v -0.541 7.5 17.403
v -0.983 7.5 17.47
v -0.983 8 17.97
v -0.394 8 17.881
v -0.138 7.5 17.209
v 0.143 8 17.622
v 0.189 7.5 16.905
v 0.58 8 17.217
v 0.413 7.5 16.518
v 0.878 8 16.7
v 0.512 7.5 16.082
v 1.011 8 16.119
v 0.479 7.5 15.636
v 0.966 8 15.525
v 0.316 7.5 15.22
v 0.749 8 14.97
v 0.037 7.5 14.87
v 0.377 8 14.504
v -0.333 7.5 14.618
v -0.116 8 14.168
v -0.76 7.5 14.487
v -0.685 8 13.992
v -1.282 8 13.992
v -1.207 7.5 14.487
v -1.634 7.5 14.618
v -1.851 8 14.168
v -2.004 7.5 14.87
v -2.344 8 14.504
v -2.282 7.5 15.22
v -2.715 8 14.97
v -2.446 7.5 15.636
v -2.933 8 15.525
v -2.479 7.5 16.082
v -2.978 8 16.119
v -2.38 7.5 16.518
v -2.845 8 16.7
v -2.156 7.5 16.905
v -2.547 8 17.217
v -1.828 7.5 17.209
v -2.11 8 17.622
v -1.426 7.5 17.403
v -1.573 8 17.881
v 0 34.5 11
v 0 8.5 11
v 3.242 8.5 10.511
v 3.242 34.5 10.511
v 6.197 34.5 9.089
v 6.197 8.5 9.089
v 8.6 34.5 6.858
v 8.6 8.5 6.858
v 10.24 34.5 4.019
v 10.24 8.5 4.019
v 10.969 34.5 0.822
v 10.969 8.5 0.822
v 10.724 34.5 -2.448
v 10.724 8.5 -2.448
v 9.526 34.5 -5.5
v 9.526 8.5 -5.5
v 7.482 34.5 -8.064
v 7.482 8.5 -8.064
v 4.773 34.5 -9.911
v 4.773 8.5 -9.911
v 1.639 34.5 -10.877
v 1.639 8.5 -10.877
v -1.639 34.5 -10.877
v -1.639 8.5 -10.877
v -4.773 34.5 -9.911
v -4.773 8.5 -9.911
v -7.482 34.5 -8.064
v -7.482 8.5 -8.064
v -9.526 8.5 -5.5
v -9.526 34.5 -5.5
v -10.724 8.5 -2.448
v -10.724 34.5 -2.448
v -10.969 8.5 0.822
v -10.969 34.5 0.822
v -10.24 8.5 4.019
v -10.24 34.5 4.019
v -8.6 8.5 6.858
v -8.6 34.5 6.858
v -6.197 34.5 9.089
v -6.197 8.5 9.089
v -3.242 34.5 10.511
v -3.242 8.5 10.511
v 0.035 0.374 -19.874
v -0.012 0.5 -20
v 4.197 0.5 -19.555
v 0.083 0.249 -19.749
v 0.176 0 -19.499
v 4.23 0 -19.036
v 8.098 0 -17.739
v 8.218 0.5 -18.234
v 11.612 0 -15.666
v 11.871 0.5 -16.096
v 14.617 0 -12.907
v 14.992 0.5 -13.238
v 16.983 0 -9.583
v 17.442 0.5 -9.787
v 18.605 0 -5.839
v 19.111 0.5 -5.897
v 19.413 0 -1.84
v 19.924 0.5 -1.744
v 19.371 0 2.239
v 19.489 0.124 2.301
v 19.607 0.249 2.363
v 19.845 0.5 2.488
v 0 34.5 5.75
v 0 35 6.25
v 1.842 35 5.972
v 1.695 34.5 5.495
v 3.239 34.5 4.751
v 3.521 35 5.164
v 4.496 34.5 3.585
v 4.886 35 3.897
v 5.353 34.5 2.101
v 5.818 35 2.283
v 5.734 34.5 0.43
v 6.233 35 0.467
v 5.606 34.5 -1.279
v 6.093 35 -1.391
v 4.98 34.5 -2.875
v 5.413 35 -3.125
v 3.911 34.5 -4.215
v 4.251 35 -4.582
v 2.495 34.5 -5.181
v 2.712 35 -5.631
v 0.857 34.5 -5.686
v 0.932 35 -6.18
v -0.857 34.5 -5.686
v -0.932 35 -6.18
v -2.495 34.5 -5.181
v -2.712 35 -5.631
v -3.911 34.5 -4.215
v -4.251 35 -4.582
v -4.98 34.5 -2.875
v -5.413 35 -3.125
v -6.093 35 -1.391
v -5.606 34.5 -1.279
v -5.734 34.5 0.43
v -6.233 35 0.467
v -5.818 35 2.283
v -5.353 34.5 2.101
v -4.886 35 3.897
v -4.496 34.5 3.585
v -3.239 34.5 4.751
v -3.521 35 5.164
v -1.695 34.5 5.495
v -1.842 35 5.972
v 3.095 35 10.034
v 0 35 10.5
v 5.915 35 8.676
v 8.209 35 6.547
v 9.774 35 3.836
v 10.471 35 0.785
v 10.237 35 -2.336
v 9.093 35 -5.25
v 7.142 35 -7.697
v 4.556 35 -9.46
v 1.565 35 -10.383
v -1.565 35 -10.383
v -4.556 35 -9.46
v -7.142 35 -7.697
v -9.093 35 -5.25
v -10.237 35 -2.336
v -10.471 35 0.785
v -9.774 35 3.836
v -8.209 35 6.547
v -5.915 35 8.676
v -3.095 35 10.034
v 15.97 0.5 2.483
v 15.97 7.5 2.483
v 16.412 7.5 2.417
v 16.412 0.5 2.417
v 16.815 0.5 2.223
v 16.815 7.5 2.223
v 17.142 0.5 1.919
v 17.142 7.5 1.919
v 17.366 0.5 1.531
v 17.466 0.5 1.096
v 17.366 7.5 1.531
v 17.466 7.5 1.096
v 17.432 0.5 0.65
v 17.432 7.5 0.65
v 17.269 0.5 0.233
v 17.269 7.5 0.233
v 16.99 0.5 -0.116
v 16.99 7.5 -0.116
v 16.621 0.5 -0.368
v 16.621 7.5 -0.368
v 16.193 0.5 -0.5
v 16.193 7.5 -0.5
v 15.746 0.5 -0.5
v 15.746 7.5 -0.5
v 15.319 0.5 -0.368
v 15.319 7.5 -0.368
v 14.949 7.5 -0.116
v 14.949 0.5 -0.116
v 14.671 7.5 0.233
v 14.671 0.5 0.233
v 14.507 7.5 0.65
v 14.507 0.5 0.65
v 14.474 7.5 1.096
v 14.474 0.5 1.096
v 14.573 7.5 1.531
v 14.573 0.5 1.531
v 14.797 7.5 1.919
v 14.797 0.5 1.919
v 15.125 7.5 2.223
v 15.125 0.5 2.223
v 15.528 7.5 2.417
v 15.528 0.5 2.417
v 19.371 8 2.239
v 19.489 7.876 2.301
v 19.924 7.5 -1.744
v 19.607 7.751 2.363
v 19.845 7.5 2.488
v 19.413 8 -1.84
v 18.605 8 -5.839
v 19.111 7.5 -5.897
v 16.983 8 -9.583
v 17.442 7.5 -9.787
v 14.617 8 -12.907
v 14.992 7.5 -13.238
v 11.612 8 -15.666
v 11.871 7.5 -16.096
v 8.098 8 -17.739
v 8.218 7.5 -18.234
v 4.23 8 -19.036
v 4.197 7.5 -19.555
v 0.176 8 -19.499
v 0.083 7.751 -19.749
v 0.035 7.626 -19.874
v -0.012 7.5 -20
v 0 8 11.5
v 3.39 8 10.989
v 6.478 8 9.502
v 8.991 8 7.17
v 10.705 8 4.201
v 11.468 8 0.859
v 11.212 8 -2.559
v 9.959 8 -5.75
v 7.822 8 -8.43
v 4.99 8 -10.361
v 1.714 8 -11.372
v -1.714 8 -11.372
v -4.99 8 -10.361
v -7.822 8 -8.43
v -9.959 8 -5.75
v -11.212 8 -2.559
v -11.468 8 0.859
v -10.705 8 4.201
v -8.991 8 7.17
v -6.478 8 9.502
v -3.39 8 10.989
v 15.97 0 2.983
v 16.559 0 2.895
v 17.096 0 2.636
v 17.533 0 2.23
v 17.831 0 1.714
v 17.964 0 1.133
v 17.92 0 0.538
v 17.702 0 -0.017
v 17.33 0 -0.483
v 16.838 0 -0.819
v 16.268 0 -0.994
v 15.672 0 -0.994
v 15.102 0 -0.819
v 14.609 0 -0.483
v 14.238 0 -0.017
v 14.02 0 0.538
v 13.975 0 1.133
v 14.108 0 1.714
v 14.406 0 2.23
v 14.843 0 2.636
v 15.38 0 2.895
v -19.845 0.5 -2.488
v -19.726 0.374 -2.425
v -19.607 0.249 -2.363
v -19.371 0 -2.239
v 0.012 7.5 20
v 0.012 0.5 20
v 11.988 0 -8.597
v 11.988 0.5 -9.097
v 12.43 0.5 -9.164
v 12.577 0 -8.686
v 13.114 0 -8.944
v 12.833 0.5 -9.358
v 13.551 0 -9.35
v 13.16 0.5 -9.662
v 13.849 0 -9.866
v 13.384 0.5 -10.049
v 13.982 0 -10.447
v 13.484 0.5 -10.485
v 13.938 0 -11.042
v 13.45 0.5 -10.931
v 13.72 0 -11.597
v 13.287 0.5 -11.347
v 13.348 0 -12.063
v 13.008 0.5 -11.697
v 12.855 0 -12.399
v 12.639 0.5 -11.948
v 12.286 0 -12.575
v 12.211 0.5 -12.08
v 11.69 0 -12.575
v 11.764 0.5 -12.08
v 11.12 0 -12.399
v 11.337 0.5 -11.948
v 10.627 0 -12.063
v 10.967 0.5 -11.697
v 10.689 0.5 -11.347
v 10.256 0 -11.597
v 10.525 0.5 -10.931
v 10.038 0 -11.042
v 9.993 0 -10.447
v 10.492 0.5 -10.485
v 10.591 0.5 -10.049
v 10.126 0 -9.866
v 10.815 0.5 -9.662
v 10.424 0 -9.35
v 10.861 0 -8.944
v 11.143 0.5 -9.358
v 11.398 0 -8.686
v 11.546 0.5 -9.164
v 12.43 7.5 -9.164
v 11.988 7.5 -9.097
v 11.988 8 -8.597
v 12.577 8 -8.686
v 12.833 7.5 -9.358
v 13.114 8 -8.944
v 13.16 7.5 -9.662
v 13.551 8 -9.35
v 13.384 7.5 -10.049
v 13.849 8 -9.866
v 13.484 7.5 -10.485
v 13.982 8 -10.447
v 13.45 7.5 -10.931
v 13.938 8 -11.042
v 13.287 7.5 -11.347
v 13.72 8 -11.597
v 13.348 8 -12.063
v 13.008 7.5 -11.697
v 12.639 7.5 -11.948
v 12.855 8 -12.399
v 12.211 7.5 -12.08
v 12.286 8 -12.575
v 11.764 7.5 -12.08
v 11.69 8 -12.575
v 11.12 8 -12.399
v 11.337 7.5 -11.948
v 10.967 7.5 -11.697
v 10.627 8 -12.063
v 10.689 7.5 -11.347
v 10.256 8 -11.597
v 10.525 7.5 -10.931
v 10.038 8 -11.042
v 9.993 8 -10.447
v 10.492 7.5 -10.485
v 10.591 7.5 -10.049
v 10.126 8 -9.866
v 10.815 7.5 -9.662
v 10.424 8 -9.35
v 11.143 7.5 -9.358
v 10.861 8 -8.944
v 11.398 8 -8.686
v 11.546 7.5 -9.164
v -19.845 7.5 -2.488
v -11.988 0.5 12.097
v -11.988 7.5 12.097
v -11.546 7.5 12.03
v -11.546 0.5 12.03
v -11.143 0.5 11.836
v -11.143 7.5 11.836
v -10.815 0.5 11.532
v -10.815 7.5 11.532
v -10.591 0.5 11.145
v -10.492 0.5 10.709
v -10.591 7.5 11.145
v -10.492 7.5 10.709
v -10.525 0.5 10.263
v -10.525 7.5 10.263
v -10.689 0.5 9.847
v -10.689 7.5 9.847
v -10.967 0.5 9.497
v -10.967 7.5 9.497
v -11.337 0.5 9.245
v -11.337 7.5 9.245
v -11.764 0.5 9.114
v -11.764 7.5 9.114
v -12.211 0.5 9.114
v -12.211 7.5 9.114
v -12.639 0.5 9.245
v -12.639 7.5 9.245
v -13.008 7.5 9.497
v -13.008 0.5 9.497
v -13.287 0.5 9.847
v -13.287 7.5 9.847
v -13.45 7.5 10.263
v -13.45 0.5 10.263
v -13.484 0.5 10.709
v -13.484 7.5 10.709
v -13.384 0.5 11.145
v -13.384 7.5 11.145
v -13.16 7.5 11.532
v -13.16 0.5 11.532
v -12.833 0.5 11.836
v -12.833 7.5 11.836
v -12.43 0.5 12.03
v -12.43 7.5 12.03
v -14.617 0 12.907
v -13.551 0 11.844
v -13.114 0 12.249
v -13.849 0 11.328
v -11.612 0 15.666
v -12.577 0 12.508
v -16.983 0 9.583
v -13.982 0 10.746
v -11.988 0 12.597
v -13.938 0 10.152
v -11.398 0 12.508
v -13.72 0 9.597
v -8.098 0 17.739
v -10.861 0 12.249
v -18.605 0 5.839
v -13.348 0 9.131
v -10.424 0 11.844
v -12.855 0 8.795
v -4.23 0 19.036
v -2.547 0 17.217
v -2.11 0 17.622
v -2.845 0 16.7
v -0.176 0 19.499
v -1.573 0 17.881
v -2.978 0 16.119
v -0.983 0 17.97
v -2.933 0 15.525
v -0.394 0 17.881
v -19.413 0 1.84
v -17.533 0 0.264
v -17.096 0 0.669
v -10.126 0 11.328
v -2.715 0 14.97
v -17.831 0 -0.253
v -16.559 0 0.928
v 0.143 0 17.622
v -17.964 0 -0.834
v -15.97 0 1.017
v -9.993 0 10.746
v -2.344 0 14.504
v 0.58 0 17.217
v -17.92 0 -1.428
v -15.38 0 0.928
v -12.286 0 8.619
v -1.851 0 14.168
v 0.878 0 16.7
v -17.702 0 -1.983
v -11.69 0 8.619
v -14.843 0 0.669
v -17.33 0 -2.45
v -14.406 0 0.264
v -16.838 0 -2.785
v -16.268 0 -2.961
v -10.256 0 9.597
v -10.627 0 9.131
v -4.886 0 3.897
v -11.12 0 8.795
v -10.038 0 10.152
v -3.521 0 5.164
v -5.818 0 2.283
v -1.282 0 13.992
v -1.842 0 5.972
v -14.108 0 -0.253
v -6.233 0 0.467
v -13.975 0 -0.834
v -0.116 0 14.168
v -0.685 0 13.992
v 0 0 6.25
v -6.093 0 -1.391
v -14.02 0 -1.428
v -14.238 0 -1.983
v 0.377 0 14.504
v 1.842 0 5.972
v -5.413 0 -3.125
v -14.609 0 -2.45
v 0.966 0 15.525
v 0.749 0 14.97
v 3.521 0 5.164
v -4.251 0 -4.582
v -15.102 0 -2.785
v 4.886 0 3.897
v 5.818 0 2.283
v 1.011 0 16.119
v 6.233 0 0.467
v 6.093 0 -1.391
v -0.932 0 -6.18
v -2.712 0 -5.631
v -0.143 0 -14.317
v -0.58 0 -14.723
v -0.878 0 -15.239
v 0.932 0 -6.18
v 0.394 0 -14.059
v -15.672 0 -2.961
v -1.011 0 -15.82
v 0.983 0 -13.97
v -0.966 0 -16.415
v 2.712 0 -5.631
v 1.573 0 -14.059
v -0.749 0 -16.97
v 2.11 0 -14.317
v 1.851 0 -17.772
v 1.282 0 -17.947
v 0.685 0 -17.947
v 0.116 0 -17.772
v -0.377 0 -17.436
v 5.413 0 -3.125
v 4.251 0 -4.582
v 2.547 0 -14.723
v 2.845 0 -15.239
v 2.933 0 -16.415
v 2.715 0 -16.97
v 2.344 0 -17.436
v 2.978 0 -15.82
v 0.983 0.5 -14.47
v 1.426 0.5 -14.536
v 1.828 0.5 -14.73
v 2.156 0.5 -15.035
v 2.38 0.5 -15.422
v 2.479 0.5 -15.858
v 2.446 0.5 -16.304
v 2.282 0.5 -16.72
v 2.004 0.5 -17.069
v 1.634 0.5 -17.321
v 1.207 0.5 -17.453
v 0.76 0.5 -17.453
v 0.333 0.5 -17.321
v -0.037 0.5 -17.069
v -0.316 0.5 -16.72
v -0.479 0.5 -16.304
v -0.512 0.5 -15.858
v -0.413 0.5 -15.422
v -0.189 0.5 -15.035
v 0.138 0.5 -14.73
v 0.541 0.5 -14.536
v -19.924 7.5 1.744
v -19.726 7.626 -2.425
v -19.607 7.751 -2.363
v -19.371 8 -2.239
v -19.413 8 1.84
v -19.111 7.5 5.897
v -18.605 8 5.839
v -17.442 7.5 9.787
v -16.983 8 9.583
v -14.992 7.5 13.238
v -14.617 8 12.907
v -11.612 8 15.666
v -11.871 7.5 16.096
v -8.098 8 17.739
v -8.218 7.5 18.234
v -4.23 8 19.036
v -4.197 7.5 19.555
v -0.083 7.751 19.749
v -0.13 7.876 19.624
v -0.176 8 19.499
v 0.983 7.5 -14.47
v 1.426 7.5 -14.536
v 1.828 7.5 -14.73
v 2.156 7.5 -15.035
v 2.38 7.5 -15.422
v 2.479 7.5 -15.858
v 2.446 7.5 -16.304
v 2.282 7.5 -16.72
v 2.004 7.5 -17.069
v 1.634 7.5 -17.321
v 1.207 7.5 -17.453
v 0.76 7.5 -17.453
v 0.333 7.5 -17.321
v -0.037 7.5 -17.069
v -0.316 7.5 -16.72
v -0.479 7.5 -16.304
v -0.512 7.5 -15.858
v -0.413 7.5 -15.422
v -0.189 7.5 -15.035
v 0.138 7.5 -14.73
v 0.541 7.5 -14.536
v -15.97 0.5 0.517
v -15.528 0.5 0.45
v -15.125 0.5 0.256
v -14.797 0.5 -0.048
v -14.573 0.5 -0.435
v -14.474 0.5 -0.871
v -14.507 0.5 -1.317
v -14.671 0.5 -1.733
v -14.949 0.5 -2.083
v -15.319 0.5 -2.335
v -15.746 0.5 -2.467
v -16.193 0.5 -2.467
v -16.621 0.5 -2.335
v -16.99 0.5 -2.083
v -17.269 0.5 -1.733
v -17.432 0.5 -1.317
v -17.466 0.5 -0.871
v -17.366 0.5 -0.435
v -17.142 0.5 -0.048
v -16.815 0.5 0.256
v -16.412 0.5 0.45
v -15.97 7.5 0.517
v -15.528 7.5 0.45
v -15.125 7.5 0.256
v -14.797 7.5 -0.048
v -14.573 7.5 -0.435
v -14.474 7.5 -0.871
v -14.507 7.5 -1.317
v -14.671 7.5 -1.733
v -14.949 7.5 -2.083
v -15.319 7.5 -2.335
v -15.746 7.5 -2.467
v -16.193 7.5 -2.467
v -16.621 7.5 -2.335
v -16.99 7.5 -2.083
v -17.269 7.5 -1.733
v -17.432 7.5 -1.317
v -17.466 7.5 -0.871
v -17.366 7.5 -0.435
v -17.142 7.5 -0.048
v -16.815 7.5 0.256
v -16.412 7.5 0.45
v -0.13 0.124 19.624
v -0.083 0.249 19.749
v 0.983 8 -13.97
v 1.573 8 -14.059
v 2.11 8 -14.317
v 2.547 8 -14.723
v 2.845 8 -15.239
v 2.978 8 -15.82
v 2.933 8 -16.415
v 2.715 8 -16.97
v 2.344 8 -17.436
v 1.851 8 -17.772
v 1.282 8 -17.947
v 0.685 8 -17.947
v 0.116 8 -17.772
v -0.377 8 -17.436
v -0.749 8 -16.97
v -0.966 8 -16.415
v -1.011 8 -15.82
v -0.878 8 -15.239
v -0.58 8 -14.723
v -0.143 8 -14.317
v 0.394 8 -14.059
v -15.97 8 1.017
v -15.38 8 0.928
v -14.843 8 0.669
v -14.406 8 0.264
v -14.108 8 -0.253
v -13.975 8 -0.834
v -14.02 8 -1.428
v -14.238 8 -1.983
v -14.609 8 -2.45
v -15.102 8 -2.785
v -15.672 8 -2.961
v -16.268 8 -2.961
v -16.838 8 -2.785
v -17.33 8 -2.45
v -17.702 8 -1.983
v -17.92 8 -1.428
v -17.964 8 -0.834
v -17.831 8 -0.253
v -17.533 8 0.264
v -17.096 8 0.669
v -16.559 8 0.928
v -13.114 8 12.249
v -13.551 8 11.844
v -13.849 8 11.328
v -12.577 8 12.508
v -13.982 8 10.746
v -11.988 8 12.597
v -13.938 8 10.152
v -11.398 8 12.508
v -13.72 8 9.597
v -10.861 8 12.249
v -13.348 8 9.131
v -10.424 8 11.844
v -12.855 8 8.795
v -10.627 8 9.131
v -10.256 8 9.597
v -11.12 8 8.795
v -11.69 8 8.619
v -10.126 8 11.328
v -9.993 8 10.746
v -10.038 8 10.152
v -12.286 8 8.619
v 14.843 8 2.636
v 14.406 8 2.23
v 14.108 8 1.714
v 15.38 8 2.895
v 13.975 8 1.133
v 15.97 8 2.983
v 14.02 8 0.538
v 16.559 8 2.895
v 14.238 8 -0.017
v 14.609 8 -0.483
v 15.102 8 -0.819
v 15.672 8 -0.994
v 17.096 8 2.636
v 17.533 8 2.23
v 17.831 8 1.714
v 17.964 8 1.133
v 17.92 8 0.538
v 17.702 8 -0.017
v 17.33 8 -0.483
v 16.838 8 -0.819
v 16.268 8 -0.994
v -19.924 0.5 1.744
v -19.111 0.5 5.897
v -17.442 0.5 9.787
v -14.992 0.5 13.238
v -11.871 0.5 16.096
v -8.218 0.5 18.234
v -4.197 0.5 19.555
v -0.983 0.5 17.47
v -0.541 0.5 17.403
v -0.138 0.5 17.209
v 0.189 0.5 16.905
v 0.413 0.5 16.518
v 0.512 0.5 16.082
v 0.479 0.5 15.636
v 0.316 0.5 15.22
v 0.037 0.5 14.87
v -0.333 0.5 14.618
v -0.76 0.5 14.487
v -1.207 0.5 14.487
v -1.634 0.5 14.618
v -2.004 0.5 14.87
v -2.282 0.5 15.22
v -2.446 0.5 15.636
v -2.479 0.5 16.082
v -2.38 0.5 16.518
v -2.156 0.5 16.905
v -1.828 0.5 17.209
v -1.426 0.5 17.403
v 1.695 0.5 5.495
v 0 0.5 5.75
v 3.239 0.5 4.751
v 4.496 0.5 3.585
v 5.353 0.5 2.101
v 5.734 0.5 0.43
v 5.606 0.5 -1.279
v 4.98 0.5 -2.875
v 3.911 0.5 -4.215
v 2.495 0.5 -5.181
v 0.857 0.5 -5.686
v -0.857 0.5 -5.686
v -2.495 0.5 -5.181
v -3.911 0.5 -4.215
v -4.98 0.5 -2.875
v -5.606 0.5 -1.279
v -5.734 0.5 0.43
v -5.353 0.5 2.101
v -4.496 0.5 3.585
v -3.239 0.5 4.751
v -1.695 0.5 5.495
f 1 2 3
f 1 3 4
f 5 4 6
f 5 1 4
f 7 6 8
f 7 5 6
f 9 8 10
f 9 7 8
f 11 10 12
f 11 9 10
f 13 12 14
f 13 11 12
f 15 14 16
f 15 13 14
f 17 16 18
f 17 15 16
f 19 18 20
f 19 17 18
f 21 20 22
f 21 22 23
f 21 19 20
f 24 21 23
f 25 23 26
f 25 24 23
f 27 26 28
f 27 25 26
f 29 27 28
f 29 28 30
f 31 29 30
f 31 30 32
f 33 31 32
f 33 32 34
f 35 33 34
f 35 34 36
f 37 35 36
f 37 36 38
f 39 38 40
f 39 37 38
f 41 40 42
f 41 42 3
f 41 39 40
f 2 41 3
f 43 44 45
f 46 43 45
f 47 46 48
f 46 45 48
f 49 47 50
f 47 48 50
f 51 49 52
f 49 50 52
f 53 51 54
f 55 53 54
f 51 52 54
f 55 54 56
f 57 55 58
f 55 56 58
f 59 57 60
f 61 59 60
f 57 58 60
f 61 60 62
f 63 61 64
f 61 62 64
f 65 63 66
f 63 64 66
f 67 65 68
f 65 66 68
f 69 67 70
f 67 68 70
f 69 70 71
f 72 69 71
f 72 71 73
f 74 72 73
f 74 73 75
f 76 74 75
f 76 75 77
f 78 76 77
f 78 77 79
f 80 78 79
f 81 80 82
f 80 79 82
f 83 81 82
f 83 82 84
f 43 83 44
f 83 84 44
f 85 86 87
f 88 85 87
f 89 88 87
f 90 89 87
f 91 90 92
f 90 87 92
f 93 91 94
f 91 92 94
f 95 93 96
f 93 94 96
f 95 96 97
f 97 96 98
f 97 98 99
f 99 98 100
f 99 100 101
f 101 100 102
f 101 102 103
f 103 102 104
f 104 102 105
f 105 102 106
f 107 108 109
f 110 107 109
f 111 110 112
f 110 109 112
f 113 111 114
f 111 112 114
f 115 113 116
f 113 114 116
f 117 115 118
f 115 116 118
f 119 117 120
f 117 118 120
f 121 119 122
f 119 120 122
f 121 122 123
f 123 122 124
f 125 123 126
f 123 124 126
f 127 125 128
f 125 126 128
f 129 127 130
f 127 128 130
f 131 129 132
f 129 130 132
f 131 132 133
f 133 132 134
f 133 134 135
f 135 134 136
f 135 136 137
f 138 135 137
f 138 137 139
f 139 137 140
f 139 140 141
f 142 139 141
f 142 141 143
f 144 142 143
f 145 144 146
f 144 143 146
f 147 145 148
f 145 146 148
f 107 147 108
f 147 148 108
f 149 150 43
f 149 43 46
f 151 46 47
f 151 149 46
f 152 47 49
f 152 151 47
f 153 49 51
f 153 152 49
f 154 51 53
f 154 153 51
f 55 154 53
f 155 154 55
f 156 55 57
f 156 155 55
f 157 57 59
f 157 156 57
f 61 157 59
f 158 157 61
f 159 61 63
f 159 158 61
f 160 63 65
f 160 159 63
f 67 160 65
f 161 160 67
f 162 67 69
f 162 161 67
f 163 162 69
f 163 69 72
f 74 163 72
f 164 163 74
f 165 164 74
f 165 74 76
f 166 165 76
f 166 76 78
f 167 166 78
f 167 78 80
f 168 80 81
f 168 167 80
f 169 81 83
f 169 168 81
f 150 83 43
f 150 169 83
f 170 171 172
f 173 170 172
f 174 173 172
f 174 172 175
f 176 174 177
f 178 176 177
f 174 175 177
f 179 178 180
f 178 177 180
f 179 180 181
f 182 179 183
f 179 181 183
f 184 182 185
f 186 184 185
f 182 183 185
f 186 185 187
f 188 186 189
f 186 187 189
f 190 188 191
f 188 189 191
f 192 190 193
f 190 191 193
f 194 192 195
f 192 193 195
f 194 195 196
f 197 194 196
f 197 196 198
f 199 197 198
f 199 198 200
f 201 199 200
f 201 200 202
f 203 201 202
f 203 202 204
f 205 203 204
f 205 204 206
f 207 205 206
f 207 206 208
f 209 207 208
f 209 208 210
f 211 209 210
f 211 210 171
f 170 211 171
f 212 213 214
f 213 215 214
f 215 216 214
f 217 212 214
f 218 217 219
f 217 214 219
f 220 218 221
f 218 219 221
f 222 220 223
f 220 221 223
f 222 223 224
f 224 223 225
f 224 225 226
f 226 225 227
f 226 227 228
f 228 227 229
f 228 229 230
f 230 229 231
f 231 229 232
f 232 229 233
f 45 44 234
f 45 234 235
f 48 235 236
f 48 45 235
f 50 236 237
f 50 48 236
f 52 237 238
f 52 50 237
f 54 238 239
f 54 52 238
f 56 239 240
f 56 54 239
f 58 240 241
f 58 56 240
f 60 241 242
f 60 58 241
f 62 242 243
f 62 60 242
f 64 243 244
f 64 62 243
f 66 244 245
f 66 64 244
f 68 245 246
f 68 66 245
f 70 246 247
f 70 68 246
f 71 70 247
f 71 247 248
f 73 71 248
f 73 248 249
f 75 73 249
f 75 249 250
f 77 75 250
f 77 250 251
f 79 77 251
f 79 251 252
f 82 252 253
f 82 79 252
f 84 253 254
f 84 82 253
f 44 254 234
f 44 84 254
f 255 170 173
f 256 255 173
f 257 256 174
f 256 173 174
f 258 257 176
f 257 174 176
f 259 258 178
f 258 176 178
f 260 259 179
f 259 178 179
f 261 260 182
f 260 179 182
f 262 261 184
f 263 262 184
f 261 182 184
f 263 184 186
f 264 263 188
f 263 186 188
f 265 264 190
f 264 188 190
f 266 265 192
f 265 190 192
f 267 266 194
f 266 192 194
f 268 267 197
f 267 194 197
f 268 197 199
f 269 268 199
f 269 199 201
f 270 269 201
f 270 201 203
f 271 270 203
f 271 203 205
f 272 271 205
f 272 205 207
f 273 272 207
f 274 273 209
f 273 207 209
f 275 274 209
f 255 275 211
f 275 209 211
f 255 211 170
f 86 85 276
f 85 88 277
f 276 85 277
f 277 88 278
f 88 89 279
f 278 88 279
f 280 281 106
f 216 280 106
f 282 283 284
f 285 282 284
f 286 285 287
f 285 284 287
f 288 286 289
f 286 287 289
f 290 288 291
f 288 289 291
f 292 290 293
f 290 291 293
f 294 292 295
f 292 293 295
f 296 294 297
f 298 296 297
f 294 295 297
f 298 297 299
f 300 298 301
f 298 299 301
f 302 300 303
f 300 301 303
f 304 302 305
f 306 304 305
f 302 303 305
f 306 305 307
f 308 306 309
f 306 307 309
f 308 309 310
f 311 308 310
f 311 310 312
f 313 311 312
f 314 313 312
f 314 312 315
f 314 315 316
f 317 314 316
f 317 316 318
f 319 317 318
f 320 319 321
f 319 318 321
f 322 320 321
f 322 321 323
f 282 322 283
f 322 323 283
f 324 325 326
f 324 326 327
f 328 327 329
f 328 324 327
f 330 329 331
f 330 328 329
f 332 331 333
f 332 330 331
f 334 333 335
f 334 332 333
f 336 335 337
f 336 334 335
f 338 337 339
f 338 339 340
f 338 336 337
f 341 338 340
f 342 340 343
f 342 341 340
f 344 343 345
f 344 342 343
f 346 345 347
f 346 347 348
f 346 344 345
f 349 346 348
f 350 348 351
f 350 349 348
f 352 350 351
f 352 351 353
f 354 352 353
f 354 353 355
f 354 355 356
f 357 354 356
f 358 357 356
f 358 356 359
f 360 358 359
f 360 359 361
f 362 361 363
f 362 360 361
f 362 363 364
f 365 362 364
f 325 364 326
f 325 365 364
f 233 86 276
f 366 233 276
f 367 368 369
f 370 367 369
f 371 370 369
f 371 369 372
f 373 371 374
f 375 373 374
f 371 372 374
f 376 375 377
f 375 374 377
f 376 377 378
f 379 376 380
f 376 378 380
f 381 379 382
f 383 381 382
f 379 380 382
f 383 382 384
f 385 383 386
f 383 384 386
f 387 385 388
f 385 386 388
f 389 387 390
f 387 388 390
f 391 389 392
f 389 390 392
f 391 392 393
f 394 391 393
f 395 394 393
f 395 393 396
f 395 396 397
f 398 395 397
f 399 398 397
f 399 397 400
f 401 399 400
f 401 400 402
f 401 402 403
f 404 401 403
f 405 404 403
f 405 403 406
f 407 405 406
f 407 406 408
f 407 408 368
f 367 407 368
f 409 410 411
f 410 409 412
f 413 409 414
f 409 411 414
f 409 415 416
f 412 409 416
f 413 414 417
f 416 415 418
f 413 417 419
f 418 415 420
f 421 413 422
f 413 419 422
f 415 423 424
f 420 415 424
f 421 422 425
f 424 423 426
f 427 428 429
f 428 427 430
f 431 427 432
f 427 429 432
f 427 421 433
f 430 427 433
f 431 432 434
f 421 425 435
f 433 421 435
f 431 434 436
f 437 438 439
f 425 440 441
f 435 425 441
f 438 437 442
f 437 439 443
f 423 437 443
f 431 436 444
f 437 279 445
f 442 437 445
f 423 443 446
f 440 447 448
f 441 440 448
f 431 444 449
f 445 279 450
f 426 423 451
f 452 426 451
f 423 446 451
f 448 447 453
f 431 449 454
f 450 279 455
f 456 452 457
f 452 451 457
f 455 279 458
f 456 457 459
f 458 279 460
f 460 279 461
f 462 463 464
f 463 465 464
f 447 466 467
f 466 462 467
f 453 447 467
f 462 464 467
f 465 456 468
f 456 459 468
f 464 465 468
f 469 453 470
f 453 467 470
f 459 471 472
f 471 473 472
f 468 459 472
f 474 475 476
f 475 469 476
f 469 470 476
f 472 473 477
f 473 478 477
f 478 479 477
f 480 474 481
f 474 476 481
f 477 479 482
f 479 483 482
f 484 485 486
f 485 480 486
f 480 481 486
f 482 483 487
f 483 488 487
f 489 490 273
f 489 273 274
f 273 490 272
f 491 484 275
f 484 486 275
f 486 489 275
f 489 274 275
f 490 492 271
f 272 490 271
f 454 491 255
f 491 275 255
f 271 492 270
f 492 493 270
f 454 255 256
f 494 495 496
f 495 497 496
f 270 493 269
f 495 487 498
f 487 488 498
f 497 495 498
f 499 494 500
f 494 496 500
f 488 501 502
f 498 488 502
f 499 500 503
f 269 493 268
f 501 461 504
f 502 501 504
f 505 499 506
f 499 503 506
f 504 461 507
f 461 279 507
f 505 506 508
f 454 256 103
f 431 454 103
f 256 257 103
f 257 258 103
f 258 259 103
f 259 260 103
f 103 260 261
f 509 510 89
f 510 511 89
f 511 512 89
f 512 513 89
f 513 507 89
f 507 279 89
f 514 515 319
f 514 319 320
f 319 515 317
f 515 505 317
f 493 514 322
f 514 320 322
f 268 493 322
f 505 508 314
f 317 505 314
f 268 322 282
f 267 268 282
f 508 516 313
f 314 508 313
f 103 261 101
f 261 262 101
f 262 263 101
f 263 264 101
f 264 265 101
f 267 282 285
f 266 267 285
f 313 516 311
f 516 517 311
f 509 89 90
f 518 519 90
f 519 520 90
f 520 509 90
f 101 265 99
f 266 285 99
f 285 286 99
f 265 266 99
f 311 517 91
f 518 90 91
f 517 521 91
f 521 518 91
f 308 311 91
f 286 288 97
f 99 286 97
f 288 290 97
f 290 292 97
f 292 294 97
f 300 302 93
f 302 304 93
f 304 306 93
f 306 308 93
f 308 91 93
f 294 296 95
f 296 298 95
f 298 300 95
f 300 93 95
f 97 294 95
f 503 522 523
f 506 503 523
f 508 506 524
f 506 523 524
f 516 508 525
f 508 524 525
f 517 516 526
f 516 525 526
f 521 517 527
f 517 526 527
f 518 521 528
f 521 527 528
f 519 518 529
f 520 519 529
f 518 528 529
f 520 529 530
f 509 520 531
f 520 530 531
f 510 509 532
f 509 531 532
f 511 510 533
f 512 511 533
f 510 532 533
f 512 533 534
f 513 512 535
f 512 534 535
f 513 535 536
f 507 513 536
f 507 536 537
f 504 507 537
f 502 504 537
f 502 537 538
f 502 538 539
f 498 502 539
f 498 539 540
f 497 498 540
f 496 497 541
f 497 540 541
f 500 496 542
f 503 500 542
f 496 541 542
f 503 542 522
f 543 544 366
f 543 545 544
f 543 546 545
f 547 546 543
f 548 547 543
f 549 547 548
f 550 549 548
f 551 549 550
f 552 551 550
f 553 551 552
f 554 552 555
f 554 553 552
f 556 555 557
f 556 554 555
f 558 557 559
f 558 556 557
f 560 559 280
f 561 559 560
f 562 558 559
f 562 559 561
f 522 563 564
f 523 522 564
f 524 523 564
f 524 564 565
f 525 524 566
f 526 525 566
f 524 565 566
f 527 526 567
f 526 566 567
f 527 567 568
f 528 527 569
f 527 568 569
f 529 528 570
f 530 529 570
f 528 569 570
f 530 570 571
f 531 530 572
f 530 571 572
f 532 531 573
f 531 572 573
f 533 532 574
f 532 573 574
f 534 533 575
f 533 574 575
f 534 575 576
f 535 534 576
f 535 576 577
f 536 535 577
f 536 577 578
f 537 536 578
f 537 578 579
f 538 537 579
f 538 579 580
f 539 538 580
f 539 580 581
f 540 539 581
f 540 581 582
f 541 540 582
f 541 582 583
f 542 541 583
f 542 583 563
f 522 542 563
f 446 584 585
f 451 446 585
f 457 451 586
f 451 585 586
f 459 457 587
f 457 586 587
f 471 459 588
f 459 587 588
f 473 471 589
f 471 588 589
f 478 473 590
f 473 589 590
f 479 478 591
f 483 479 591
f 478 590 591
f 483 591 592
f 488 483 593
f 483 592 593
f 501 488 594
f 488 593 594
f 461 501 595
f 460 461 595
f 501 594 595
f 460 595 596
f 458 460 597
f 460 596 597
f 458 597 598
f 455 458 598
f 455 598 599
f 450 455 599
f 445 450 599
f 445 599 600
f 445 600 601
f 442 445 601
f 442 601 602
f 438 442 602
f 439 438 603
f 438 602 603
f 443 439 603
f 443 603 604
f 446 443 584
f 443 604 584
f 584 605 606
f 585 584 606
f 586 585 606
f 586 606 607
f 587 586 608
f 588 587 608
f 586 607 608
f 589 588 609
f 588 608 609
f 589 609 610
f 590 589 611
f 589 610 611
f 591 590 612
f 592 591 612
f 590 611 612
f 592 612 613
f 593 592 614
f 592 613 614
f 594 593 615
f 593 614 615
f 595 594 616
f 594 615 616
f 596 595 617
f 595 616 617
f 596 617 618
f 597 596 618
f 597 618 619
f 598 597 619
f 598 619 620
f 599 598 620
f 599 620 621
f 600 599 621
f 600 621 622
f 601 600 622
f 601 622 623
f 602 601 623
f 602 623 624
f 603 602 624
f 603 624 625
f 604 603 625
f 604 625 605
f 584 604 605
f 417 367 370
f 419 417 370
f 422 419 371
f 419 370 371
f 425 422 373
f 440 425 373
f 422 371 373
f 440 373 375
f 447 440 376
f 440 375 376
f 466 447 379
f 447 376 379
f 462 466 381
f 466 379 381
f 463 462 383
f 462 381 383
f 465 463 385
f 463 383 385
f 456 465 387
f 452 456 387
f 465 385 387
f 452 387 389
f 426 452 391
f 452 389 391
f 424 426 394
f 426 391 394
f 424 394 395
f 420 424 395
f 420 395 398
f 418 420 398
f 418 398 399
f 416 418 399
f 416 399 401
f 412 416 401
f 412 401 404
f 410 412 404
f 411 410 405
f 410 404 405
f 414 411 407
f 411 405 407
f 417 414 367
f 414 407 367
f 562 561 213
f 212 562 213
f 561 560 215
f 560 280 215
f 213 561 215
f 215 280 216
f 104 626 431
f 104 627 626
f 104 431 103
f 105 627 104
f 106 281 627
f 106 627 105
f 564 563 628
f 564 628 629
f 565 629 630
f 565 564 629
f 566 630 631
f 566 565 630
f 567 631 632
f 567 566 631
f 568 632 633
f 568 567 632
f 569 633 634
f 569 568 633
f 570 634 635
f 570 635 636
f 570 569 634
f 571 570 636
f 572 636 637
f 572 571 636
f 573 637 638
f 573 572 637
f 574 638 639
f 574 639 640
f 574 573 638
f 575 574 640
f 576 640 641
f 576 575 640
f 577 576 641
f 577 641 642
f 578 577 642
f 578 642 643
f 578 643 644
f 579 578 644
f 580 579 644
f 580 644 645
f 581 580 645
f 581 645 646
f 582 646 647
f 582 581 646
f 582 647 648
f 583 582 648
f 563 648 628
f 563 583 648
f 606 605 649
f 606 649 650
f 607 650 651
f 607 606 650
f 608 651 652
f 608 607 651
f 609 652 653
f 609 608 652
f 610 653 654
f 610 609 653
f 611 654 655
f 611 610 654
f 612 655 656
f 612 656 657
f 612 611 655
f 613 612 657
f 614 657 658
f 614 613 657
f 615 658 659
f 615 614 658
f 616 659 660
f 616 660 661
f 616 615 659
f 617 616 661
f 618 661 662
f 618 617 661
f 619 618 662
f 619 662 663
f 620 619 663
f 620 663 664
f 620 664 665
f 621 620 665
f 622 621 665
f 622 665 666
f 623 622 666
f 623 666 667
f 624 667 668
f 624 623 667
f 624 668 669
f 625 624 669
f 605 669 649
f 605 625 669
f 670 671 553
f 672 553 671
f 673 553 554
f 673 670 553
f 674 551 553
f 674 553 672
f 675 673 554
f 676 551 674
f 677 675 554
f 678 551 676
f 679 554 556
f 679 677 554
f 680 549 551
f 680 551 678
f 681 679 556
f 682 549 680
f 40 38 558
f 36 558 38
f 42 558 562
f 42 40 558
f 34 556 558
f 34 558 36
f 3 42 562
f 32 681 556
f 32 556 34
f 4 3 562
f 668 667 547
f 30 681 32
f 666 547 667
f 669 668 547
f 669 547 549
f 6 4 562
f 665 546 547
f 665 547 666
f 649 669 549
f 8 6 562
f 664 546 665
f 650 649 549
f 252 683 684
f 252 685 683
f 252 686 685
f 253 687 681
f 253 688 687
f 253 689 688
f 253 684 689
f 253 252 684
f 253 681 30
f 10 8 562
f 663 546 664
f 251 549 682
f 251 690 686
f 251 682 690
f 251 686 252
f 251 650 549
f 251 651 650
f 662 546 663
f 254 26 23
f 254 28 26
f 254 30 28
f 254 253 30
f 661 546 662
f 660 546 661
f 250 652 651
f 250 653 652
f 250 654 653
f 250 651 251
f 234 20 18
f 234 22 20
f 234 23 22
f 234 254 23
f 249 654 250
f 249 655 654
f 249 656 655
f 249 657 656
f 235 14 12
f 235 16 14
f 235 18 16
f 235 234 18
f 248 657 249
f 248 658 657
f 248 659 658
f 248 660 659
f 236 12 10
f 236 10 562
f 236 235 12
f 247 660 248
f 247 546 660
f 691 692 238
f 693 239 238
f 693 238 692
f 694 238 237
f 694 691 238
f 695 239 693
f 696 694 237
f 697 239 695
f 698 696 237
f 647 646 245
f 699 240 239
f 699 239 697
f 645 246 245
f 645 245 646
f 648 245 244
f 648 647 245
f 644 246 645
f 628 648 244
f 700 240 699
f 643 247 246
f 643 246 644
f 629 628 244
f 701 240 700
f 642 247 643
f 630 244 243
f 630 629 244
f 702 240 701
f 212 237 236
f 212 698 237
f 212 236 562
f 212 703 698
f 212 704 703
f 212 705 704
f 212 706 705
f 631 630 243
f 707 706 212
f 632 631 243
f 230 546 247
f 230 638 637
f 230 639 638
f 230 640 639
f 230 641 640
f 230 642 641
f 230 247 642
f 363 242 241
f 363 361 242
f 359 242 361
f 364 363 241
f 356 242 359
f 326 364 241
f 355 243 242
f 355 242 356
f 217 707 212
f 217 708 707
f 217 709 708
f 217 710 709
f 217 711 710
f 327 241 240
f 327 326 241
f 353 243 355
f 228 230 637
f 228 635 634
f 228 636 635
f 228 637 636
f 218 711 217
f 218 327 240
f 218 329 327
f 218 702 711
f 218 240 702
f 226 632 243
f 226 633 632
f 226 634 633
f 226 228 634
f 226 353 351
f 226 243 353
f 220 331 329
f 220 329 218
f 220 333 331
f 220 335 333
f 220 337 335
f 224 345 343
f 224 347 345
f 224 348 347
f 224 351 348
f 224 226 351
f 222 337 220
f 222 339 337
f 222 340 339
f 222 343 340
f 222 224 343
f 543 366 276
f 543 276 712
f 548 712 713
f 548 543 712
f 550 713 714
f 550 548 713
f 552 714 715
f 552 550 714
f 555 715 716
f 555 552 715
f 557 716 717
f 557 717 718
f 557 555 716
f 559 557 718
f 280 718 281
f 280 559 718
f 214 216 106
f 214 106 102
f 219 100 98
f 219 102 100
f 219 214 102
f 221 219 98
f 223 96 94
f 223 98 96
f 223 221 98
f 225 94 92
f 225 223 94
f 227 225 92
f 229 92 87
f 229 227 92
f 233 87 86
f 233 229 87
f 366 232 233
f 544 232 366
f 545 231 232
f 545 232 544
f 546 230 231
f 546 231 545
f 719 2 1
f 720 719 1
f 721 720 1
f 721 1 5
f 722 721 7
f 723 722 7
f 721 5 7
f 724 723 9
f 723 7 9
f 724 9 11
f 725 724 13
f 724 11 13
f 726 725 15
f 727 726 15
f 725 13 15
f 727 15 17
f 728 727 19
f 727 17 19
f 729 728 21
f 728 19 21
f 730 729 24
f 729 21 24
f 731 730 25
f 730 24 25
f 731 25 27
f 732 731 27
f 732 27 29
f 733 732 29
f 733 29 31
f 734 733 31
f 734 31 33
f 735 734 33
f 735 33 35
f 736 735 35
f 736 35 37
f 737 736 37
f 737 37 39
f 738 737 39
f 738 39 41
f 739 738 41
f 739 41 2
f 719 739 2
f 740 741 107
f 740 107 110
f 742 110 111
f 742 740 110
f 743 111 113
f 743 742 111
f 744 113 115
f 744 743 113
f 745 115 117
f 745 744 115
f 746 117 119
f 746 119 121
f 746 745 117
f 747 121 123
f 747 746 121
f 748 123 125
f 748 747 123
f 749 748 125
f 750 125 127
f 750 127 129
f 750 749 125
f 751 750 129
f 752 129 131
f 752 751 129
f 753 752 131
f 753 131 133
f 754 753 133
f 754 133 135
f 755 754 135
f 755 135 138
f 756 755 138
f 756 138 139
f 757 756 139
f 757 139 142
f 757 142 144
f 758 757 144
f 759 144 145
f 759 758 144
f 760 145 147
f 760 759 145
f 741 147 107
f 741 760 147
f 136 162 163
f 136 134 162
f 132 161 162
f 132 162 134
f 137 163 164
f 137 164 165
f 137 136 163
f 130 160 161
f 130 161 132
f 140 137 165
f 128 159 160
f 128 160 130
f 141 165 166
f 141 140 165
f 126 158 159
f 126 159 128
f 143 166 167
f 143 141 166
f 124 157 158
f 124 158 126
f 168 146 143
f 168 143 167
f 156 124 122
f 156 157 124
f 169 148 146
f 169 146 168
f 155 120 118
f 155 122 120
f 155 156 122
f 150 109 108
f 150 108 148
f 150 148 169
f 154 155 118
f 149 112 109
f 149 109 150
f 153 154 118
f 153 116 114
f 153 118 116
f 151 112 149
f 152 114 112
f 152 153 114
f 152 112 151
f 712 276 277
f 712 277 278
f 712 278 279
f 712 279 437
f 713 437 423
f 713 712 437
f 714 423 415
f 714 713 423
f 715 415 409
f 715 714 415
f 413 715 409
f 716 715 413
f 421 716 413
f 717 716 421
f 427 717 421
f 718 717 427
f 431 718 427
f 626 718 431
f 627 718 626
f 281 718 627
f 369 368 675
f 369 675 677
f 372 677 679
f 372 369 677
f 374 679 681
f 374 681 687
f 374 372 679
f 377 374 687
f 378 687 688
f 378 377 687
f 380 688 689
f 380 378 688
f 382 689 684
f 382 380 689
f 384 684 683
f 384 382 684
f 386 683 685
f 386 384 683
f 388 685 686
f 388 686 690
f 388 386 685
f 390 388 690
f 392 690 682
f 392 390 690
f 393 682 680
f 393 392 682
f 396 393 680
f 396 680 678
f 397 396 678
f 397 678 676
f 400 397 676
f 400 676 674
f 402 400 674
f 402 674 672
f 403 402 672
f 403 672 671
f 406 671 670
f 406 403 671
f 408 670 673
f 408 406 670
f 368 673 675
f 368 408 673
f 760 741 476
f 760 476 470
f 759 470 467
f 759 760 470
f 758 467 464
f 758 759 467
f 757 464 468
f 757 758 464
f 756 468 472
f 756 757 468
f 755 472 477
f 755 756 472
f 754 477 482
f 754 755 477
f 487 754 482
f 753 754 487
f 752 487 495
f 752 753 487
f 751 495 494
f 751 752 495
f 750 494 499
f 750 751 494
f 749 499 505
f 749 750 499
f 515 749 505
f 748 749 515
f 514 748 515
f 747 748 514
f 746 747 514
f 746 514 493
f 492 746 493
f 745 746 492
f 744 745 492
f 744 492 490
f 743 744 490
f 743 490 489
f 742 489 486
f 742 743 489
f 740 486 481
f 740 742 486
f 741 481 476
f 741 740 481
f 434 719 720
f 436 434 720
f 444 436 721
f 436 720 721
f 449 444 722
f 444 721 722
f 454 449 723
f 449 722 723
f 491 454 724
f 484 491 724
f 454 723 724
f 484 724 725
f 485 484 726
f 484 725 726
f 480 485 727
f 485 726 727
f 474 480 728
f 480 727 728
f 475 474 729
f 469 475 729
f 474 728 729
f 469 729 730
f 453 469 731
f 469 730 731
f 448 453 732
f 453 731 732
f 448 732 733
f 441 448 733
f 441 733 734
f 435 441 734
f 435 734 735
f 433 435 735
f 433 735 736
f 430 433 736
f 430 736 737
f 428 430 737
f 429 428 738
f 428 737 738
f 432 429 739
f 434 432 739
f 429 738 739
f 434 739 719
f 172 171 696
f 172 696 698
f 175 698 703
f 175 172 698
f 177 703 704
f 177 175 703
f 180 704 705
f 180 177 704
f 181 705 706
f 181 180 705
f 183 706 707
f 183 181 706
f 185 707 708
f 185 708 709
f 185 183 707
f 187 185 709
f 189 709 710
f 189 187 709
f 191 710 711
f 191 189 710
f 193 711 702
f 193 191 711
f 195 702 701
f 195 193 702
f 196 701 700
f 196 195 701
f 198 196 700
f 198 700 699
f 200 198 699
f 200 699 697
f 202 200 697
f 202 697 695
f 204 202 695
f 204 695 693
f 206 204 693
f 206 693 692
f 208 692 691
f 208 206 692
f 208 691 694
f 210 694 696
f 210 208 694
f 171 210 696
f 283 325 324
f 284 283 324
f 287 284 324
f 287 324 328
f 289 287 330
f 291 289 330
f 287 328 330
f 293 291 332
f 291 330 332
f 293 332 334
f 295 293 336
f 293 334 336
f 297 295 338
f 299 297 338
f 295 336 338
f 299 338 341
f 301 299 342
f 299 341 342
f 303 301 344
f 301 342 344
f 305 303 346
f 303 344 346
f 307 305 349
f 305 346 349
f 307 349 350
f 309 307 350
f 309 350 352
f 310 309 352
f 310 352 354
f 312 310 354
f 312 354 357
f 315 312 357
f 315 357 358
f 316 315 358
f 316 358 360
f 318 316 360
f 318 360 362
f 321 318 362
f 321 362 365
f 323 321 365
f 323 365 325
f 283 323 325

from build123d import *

# Parameters (mm, degrees)
EXTRUDE_1_DEPTH     = 8
SKETCH_2_R          = 11
SKETCH_2_R_2        = 5.75
EXTRUDE_2_DEPTH     = 27
CUT_EXTRUDE_START   = -27
SKETCH_3_R          = 5.75
CUT_EXTRUDE_1_DEPTH = 27
SKETCH_4_R          = 43.168143545
SKETCH_4_R_2        = 20
CUT_EXTRUDE_2_DEPTH = 27
SKETCH_5_R          = 1.5
CUT_EXTRUDE_3_DEPTH = 40.102429592
CHAMFER_1_SIZE      = 0.5


with BuildPart() as part:
    # 草图1 → 凸台-拉伸1 (new body)
    with BuildSketch(Plane(origin=(0, 0, 0), x_dir=(1, 0, 0), z_dir=(0, 1, 0))):
        with BuildLine():
            Line((6.085610762, 25.384237528), (-25.942357498, -2.896249422))
            ThreePointArc((-25.942357498, -2.896249422), (-19.567194229, -17.277704803), (-6.085610762, -25.384237528))
            Line((-6.085610762, -25.384237528), (25.942357498, 2.896249422))
            ThreePointArc((25.942357498, 2.896249422), (19.567194229, 17.277704803), (6.085610762, 25.384237528))
        make_face()
    extrude(amount=EXTRUDE_1_DEPTH)

    # 草图2 → 凸台-拉伸2 (add)
    with BuildSketch(Plane(origin=(0, 8, 0), x_dir=(1, 0, 0), z_dir=(0, 1, 0))):
        with Locations(Location((0, 0, 0), (0, 0, 270))):
            Circle(SKETCH_2_R)
        with Locations(Location((0, 0, 0), (0, 0, 270))):
            Circle(SKETCH_2_R_2, mode=Mode.SUBTRACT)
    extrude(amount=EXTRUDE_2_DEPTH)

    # 草图3 → 切除-拉伸1 (cut)
    with BuildSketch(Plane(origin=(0, 8, 0), x_dir=(1, 0, 0), z_dir=(0, 1, 0)).offset(CUT_EXTRUDE_START)):
        with Locations(Location((0, 0, 0), (0, 0, 270))):
            Circle(SKETCH_3_R)
    extrude(amount=CUT_EXTRUDE_1_DEPTH, mode=Mode.SUBTRACT)

    # 草图4 → 切除-拉伸2 (cut)
    with BuildSketch(Plane(origin=(0, 8, 0), x_dir=(1, 0, 0), z_dir=(0, 1, 0))):
        Circle(SKETCH_4_R)
        Circle(SKETCH_4_R_2, mode=Mode.SUBTRACT)
    extrude(amount=-CUT_EXTRUDE_2_DEPTH, mode=Mode.SUBTRACT)

    # 草图5 → 切除-拉伸3 (cut, through all)
    with BuildSketch(Plane(origin=(0, 8, 0), x_dir=(1, 0, 0), z_dir=(0, 1, 0))):
        with Locations(Location((0.983422311, 15.96974892, 0), (0, 0, 270))):
            Circle(SKETCH_5_R)
        with Locations(Location((11.98770234, 10.59693317, 0), (0, 0, 270))):
            Circle(SKETCH_5_R)
        with Locations(Location((15.96974892, -0.983422311, 0), (0, 0, 270))):
            Circle(SKETCH_5_R)
        with Locations(Location((-0.983422311, -15.96974892, 0), (0, 0, 270))):
            Circle(SKETCH_5_R)
        with Locations(Location((-11.98770234, -10.59693317, 0), (0, 0, 270))):
            Circle(SKETCH_5_R)
        with Locations(Location((-15.96974892, 0.983422311, 0), (0, 0, 270))):
            Circle(SKETCH_5_R)
    extrude(amount=-CUT_EXTRUDE_3_DEPTH, mode=Mode.SUBTRACT)

    # 倒角1
    chamfer_1_edges = [part.edges().sort_by_distance(p)[0] for p in [
        (0, 35, -11),
        (0, 8, -11),
        (0, 35, -5.75),
        (0, 0, -5.75),
        (9.928373368, 0, 11.243994053),
        (-9.928373368, 0, -11.243994053),
        (-14.991992071, 0, 13.237831157),
        (14.991992071, 0, -13.237831157),
        (9.928373368, 8, 11.243994053),
        (-9.928373368, 8, -11.243994053),
        (14.991992071, 8, -13.237831157),
        (-14.991992071, 8, 13.237831157),
        (0.983422311, 0, -17.46974892),
        (0.983422311, 8, -17.46974892),
        (11.98770234, 0, -12.09693317),
        (11.98770234, 8, -12.09693317),
        (15.96974892, 0, -0.516577689),
        (15.96974892, 8, -0.516577689),
        (-0.983422311, 0, 14.46974892),
        (-0.983422311, 8, 14.46974892),
        (-11.98770234, 0, 9.09693317),
        (-11.98770234, 8, 9.09693317),
        (-15.96974892, 0, -2.483422311),
        (-15.96974892, 8, -2.483422311),
    ]]
    chamfer(chamfer_1_edges, length=CHAMFER_1_SIZE)


solid = part.part
